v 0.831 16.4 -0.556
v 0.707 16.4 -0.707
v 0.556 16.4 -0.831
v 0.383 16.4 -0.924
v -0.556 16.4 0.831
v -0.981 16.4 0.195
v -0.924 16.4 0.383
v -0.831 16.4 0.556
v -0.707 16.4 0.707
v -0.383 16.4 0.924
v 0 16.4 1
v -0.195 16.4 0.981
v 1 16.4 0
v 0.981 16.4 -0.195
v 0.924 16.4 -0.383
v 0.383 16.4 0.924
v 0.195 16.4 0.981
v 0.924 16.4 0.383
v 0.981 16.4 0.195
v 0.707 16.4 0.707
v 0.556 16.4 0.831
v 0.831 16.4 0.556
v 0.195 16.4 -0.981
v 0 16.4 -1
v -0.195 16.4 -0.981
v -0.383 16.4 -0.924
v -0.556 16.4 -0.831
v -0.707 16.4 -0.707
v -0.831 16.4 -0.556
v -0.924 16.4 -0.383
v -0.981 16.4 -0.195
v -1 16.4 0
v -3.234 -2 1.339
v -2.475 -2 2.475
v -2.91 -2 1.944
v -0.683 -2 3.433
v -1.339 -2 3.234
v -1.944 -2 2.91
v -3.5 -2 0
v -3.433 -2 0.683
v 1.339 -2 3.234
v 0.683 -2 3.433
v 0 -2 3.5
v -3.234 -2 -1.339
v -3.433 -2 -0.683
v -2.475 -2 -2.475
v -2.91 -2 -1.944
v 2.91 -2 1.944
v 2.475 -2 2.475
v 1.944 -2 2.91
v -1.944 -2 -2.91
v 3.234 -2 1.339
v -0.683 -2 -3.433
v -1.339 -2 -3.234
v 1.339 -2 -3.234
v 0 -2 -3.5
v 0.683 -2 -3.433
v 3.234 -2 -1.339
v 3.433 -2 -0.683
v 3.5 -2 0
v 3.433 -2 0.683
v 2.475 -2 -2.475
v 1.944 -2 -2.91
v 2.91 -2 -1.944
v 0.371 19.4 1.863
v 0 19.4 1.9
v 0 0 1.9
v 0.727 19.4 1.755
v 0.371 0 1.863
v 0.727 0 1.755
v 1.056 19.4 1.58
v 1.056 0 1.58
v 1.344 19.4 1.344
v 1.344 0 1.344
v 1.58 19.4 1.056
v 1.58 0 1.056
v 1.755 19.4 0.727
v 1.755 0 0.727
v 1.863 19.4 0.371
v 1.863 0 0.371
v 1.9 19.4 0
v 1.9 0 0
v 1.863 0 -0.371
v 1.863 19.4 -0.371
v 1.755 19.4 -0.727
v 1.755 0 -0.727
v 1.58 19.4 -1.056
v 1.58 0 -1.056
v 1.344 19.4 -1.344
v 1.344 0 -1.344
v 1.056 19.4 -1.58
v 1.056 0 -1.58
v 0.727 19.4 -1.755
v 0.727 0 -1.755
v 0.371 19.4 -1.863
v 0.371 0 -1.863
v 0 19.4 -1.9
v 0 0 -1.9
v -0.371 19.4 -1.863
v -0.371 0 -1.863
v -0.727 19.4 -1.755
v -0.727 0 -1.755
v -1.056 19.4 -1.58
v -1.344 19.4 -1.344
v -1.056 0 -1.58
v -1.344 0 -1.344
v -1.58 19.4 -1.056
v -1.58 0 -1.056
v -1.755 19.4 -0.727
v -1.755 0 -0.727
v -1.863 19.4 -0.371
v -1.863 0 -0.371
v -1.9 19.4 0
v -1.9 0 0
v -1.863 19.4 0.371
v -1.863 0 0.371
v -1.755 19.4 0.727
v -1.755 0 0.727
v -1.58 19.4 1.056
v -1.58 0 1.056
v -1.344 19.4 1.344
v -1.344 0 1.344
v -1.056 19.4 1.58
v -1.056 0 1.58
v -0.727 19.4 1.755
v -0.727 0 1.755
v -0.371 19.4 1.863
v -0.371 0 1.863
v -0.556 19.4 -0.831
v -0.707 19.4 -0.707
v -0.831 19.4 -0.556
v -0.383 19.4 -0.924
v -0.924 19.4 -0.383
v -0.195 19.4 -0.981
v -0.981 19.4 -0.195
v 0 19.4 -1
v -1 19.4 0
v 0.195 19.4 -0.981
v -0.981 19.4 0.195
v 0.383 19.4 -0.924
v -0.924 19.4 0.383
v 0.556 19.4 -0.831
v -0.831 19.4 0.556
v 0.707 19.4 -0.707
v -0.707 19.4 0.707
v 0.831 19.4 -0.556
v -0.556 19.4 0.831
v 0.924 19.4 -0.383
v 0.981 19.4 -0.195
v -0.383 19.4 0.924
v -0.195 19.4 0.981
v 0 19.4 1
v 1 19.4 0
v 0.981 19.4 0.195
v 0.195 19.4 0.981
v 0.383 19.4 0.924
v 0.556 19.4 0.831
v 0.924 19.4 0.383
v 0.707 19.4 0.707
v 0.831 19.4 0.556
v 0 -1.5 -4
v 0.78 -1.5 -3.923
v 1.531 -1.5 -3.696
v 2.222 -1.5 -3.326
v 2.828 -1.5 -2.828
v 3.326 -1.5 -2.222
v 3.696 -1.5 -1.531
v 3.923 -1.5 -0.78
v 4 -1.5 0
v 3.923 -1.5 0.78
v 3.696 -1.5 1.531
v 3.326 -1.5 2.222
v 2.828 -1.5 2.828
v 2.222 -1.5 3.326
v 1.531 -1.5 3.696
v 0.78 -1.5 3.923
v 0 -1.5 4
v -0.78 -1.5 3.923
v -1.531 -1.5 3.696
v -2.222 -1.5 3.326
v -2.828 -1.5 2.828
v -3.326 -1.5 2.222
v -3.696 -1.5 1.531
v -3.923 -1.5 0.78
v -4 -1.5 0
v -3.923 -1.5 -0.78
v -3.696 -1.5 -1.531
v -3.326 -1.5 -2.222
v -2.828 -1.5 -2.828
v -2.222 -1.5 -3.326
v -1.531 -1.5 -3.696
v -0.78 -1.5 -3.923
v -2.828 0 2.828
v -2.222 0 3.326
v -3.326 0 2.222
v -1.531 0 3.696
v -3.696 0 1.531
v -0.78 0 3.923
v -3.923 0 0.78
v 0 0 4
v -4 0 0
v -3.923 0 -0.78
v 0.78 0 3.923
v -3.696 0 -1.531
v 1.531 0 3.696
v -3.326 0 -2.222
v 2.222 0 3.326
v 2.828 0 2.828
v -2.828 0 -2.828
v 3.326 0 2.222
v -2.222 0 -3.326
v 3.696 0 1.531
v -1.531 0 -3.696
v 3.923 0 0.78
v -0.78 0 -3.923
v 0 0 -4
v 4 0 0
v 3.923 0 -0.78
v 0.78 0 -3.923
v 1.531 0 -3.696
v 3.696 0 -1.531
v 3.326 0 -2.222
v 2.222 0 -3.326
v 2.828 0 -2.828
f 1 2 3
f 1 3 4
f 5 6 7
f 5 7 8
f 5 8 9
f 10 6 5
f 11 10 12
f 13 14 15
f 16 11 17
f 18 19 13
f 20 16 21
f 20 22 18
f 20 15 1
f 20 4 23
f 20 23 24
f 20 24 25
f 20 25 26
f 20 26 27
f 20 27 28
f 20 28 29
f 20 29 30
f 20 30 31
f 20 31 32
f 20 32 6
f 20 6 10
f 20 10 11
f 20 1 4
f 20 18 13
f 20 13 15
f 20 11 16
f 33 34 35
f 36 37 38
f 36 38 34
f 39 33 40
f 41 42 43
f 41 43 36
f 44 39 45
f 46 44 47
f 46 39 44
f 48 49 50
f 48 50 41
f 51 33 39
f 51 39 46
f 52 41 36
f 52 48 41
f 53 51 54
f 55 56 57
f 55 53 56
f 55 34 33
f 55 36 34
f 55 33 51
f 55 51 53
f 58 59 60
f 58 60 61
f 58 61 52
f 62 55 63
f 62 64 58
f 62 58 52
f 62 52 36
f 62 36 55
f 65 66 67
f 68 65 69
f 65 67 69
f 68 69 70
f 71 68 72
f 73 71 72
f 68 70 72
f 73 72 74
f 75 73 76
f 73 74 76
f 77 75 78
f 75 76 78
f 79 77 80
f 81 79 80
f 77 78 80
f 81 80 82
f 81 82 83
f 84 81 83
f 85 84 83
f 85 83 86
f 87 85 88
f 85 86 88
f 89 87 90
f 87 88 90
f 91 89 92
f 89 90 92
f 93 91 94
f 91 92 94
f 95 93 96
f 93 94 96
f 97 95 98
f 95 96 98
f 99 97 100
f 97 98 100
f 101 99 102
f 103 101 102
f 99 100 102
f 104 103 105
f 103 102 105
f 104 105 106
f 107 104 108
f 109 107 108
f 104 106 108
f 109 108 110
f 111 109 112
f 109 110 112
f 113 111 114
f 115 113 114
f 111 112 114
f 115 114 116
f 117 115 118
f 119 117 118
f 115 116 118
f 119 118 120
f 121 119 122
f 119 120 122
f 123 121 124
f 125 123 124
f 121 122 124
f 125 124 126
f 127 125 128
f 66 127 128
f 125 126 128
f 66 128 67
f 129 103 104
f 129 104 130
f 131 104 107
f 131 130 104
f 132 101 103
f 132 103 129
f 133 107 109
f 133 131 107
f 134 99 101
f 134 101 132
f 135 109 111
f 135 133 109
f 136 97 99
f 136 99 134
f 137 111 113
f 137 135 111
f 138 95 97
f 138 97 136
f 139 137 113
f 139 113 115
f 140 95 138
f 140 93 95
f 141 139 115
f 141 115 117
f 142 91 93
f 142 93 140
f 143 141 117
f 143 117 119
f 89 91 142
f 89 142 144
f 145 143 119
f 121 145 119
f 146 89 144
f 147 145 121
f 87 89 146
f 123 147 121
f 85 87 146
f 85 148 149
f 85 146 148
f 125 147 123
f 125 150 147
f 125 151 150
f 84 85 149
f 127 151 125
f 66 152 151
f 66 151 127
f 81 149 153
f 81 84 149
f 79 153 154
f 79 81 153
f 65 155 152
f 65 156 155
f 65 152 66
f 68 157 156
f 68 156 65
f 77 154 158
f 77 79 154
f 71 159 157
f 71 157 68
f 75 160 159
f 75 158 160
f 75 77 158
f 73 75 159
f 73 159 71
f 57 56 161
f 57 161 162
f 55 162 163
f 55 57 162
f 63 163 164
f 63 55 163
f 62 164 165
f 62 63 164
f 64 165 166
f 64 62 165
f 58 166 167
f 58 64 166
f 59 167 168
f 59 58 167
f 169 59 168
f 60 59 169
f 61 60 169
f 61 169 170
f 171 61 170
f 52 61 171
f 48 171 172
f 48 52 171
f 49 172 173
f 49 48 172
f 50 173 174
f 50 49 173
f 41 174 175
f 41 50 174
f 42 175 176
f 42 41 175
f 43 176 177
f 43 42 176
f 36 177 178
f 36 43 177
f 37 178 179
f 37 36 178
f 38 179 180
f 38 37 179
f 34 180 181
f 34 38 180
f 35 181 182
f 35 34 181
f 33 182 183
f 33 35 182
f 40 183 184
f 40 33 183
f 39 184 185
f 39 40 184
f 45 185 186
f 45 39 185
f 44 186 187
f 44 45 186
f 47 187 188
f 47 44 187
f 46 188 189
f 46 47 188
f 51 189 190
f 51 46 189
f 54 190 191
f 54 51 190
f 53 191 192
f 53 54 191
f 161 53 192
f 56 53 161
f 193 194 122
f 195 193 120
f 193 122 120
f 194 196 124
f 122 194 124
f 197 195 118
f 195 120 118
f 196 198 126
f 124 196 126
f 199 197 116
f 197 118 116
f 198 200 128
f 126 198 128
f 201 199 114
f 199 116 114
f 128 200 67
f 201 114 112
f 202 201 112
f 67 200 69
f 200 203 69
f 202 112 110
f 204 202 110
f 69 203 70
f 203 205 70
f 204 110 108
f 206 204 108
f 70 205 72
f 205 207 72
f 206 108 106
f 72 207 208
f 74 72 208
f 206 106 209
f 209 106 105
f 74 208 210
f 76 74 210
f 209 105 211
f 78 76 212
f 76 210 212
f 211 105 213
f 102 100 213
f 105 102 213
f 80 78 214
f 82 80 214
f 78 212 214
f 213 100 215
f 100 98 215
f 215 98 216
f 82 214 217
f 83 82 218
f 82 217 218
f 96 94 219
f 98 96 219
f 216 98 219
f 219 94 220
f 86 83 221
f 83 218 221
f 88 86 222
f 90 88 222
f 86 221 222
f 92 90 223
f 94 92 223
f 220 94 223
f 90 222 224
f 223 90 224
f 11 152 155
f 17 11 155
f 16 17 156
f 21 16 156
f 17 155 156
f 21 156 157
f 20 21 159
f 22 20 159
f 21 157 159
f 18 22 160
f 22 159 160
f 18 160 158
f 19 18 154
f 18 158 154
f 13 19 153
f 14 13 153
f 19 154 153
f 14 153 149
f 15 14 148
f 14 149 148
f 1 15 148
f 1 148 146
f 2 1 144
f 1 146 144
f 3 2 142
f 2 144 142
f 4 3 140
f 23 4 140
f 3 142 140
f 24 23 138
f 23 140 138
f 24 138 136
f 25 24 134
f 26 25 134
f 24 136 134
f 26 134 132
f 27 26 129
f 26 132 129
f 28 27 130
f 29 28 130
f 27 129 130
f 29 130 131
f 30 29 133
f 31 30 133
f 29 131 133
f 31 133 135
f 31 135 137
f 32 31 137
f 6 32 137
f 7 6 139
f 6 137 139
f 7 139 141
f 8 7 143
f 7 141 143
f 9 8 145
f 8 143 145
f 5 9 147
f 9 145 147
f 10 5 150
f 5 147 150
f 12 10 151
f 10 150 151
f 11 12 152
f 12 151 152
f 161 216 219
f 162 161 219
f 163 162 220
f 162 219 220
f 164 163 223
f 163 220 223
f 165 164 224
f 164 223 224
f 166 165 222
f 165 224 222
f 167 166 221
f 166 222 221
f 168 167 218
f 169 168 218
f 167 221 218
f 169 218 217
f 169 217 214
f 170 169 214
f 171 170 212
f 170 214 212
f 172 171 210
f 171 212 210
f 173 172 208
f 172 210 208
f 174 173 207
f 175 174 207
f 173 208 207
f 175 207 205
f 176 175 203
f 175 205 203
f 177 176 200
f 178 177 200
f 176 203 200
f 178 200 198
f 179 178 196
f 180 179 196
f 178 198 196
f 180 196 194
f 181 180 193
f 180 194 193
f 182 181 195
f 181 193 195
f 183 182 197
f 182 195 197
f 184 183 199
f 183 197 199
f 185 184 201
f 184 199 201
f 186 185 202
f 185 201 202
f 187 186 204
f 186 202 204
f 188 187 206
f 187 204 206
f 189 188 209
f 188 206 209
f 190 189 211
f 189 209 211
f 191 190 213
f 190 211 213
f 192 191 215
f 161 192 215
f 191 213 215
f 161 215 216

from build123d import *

# Parameters (mm, degrees)
SKETCH1_R           = 1.9
BOSS_EXTRUDE1_DEPTH = 19.4
SKETCH2_R           = 4
BOSS_EXTRUDE2_DEPTH = 2
CHAMFER1_SIZE       = 0.5
SKETCH3_R           = 1
CUT_EXTRUDE1_DEPTH  = 3


with BuildPart() as part:
    # Sketch1 → Boss-Extrude1 (new body)
    with BuildSketch(Plane(origin=(0, 0, 0), x_dir=(1, 0, 0), z_dir=(0, 1, 0))):
        with Locations(Location((0, 0, 0), (0, 0, 270))):
            Circle(SKETCH1_R)
    extrude(amount=BOSS_EXTRUDE1_DEPTH)

    # Sketch2 → Boss-Extrude2 (add)
    with BuildSketch(Plane.XZ):
        with Locations(Location((0, 0, 0), (0, 0, 270))):
            Circle(SKETCH2_R)
    extrude(amount=BOSS_EXTRUDE2_DEPTH)

    # Chamfer1
    chamfer1_edges = [part.edges().sort_by_distance(p)[0] for p in [
        (0, -2, 4),
    ]]
    chamfer(chamfer1_edges, length=CHAMFER1_SIZE)

    # Sketch3 → Cut-Extrude1 (cut)
    with BuildSketch(Plane(origin=(0, 19.4, 0), x_dir=(1, 0, 0), z_dir=(0, 1, 0))):
        with Locations(Location((0, 0, 0), (0, 0, 270))):
            Circle(SKETCH3_R)
    extrude(amount=-CUT_EXTRUDE1_DEPTH, mode=Mode.SUBTRACT)


solid = part.part
